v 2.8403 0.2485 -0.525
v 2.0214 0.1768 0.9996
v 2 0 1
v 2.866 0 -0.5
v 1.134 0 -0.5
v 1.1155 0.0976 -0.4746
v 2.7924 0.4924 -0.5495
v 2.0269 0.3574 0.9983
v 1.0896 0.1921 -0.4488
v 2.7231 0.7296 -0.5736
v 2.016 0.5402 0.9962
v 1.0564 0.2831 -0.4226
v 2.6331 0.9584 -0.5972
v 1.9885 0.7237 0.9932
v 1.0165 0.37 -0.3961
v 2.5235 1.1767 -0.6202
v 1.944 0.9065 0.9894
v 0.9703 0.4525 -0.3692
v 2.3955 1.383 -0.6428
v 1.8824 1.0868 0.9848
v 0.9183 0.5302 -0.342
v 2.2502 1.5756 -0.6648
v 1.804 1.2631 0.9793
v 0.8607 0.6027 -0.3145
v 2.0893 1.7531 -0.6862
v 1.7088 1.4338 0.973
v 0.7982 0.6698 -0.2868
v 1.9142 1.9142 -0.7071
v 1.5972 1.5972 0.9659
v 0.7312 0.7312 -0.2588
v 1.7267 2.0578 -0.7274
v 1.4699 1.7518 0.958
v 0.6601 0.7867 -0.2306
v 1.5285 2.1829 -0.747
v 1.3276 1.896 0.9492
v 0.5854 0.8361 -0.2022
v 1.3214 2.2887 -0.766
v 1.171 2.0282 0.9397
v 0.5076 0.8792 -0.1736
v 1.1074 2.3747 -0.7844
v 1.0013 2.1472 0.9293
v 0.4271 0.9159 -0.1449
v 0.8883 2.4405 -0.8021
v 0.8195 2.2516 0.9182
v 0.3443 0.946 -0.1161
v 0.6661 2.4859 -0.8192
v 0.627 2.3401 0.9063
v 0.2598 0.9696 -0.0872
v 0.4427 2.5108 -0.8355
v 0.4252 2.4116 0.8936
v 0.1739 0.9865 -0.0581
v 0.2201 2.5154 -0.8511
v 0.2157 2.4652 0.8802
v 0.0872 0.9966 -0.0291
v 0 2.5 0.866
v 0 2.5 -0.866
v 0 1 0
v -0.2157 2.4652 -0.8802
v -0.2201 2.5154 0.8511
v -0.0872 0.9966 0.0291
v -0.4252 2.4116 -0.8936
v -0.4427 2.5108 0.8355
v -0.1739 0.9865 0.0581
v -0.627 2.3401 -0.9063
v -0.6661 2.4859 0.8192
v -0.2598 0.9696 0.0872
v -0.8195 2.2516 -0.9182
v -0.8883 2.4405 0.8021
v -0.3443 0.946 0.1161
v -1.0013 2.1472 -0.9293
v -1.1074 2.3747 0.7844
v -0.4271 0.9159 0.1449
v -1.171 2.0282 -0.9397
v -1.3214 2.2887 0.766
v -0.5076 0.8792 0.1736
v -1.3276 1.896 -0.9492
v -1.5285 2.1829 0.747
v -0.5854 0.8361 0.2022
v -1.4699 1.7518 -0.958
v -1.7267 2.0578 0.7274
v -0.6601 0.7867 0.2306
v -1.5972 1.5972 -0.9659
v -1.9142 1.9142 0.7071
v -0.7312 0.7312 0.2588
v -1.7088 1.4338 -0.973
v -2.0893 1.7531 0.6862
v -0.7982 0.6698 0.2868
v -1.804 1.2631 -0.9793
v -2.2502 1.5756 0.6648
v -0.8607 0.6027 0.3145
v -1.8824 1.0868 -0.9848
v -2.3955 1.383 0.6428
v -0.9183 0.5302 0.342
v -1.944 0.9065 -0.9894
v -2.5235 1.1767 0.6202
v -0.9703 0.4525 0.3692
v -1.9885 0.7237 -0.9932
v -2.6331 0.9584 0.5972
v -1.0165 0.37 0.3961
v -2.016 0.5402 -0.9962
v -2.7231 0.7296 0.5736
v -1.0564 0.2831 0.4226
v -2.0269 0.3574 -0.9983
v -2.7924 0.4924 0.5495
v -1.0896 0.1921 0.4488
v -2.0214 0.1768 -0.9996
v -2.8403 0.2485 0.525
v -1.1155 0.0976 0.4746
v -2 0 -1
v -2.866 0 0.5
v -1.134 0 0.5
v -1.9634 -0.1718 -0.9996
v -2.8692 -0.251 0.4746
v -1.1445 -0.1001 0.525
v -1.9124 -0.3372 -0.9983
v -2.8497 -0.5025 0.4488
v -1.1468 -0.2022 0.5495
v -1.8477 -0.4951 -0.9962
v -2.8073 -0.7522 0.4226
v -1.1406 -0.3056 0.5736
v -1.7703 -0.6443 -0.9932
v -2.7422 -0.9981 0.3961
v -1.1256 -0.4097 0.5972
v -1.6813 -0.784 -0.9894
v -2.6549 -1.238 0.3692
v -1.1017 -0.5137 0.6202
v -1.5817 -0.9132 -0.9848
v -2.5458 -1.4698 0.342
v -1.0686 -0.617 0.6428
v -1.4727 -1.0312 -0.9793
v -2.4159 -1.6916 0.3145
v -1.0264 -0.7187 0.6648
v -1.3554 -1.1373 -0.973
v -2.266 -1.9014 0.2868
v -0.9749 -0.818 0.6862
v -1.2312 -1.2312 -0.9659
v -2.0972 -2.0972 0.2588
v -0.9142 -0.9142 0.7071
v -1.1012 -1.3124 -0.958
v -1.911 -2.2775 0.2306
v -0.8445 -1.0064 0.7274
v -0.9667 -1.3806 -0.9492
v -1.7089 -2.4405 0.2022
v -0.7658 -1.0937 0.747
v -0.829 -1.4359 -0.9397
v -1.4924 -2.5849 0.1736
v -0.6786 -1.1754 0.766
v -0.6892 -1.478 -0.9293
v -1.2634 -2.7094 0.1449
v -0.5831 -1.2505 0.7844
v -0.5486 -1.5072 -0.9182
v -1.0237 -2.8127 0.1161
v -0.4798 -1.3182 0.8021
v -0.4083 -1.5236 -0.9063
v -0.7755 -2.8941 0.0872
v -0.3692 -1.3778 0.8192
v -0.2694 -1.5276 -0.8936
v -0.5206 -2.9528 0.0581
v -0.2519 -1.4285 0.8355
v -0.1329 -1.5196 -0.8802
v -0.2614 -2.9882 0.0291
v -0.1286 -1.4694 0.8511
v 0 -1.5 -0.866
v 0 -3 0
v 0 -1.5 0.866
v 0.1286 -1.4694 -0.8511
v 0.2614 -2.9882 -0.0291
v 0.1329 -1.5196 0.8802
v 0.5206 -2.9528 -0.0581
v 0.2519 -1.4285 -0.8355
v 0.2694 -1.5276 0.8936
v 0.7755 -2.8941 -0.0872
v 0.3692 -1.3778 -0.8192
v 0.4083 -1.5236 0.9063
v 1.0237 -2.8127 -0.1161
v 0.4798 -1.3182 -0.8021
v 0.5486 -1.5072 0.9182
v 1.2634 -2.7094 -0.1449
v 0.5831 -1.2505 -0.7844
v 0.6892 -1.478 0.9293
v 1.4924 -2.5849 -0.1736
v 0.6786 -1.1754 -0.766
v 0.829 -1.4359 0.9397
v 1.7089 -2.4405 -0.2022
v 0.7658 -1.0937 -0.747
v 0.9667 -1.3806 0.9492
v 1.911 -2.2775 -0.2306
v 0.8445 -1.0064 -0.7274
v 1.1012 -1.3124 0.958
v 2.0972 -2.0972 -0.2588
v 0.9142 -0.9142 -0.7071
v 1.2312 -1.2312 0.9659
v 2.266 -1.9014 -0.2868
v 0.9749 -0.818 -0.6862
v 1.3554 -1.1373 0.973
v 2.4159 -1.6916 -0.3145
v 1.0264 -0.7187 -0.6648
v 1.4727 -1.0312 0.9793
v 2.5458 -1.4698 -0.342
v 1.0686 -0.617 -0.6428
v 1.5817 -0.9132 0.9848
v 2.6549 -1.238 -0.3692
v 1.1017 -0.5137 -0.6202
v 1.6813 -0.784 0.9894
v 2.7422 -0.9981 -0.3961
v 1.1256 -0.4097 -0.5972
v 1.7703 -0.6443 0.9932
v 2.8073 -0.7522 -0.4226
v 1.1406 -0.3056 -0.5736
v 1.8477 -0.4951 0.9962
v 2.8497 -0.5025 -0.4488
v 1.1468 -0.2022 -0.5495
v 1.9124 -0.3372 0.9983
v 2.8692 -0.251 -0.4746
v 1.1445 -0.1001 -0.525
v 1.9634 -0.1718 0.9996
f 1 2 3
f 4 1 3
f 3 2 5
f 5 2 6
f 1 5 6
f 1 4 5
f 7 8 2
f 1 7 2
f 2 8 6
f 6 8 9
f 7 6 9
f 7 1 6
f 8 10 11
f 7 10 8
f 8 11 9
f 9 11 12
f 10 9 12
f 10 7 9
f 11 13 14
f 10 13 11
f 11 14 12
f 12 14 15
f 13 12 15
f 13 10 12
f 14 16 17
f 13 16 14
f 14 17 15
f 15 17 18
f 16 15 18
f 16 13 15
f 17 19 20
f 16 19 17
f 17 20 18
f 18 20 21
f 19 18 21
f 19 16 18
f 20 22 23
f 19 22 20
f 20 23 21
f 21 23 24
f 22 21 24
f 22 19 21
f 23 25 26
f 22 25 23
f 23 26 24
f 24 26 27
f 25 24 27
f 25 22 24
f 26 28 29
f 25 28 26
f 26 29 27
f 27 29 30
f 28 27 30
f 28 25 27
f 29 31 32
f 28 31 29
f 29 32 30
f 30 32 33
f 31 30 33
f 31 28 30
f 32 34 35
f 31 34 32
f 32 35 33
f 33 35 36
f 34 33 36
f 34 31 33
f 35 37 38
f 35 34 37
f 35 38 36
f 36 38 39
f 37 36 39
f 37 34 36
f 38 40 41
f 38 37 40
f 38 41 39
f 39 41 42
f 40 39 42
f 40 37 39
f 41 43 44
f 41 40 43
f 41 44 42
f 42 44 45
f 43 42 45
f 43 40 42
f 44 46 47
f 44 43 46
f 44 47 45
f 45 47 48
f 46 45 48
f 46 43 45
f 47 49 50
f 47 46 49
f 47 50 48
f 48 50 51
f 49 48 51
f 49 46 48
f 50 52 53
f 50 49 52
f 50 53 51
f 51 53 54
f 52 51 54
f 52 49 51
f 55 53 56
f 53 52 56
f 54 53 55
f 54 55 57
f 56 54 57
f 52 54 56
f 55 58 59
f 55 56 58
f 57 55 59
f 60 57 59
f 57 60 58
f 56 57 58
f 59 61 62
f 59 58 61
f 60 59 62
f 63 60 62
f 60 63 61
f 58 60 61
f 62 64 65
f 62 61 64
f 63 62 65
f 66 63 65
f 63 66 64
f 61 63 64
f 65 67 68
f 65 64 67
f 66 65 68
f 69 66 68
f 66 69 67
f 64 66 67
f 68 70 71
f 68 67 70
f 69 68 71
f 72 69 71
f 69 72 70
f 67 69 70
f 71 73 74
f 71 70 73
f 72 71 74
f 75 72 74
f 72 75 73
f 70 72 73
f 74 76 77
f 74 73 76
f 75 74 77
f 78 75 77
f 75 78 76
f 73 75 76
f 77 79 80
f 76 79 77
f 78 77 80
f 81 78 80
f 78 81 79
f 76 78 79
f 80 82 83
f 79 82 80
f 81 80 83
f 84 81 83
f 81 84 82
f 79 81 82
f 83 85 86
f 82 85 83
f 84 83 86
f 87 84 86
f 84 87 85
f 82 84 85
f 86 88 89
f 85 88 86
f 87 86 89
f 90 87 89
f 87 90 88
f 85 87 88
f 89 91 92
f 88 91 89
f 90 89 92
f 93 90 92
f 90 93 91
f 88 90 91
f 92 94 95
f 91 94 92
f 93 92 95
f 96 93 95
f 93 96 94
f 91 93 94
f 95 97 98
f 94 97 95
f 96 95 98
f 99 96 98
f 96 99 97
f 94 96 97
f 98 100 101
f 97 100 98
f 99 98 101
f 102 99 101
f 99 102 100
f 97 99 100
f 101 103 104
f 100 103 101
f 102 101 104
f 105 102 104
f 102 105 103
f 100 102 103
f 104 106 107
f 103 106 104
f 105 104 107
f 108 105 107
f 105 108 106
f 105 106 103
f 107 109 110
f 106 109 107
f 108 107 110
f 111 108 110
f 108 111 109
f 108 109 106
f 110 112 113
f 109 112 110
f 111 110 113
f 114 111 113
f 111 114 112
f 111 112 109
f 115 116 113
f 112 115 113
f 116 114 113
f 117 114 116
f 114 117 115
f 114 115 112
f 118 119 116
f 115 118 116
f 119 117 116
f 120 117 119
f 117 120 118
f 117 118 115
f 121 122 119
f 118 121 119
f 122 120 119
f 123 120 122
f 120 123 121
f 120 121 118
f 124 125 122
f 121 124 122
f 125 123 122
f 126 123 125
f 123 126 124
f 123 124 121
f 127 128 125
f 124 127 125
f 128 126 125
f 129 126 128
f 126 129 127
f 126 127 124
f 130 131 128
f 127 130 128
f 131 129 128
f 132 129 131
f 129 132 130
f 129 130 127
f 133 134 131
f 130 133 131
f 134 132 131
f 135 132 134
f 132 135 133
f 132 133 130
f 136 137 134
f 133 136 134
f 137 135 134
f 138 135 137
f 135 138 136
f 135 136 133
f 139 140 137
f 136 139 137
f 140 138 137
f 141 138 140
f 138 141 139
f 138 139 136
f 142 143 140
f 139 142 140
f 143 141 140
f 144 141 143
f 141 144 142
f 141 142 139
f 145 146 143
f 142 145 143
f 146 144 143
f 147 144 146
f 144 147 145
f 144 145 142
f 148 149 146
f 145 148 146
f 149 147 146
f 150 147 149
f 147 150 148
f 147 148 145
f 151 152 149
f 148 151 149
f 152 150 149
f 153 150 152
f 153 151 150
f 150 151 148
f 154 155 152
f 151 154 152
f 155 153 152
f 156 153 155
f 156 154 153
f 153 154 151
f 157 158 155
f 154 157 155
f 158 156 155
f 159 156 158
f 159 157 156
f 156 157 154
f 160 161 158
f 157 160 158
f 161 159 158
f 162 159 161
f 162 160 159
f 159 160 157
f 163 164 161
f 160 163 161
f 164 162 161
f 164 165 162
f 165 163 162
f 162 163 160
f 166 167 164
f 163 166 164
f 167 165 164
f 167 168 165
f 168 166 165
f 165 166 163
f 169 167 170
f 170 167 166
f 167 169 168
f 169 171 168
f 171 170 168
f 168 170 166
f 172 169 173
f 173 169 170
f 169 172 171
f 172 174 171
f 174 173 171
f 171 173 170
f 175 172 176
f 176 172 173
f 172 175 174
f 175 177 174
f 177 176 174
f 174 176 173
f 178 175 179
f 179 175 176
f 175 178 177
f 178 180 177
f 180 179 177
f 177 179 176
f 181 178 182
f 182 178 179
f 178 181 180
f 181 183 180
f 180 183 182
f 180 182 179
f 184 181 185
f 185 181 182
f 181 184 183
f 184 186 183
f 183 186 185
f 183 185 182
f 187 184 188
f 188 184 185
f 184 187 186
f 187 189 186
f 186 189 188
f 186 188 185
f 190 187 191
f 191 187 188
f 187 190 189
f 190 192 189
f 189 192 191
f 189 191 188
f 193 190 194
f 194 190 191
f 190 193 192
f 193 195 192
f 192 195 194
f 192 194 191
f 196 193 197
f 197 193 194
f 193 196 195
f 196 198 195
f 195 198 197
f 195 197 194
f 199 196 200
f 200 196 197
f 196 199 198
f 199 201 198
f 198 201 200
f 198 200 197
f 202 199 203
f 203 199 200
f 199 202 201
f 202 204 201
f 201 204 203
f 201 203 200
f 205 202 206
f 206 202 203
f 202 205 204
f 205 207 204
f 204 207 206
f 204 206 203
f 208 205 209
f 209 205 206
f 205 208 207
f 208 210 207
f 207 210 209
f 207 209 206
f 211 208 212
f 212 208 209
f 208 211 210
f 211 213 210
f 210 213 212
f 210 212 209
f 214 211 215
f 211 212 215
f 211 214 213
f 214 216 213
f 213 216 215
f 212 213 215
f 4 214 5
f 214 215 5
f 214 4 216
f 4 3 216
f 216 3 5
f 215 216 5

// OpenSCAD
// Umbilical Torus generator, by Bruce Mueller 2013/03/30 CC-BY-SA
// inc = incremental segments

inc=5;
// r = radius of circle
// t = 'radius' of triangle -distance from center to vertex
// a = angle of rotation of triangle
// b = angle rotation around center of circle

function tri(r,t,a,b) = [(r + t*sin(a))*cos(b), (r+ t*sin(a))*sin(b), t*cos(a)];

// module to generate a rotated triangle slice, inc degrees wide
// (could not implement this in the for loop below)

module wedge(r,t,i,inc) {
	a1 = tri(r,t,i/3,i);
	b1 = tri(r,t,120+i/3,i);
	c1 = tri(r,t,240+i/3,i);
	j=i+inc;
	a2 = tri(r,t,j/3,j);
	b2 = tri(r,t,120+j/3,j);
	c2 = tri(r,t,240+j/3,j);
	
	polyhedron(
		points=[a1,b1,c1,a2,b2,c2],
		faces=[ [0,1,2], [5,4,3], 
			[3,4,0], [1,0,4],
			[3,0,2], [3,2,5],
			[5,2,4], [4,2,1] ] );
}


// created a conjoined set of triangular wedges around the circle

for (i=[0:inc:360-inc]) {
wedge(2,1,i,inc);
}
